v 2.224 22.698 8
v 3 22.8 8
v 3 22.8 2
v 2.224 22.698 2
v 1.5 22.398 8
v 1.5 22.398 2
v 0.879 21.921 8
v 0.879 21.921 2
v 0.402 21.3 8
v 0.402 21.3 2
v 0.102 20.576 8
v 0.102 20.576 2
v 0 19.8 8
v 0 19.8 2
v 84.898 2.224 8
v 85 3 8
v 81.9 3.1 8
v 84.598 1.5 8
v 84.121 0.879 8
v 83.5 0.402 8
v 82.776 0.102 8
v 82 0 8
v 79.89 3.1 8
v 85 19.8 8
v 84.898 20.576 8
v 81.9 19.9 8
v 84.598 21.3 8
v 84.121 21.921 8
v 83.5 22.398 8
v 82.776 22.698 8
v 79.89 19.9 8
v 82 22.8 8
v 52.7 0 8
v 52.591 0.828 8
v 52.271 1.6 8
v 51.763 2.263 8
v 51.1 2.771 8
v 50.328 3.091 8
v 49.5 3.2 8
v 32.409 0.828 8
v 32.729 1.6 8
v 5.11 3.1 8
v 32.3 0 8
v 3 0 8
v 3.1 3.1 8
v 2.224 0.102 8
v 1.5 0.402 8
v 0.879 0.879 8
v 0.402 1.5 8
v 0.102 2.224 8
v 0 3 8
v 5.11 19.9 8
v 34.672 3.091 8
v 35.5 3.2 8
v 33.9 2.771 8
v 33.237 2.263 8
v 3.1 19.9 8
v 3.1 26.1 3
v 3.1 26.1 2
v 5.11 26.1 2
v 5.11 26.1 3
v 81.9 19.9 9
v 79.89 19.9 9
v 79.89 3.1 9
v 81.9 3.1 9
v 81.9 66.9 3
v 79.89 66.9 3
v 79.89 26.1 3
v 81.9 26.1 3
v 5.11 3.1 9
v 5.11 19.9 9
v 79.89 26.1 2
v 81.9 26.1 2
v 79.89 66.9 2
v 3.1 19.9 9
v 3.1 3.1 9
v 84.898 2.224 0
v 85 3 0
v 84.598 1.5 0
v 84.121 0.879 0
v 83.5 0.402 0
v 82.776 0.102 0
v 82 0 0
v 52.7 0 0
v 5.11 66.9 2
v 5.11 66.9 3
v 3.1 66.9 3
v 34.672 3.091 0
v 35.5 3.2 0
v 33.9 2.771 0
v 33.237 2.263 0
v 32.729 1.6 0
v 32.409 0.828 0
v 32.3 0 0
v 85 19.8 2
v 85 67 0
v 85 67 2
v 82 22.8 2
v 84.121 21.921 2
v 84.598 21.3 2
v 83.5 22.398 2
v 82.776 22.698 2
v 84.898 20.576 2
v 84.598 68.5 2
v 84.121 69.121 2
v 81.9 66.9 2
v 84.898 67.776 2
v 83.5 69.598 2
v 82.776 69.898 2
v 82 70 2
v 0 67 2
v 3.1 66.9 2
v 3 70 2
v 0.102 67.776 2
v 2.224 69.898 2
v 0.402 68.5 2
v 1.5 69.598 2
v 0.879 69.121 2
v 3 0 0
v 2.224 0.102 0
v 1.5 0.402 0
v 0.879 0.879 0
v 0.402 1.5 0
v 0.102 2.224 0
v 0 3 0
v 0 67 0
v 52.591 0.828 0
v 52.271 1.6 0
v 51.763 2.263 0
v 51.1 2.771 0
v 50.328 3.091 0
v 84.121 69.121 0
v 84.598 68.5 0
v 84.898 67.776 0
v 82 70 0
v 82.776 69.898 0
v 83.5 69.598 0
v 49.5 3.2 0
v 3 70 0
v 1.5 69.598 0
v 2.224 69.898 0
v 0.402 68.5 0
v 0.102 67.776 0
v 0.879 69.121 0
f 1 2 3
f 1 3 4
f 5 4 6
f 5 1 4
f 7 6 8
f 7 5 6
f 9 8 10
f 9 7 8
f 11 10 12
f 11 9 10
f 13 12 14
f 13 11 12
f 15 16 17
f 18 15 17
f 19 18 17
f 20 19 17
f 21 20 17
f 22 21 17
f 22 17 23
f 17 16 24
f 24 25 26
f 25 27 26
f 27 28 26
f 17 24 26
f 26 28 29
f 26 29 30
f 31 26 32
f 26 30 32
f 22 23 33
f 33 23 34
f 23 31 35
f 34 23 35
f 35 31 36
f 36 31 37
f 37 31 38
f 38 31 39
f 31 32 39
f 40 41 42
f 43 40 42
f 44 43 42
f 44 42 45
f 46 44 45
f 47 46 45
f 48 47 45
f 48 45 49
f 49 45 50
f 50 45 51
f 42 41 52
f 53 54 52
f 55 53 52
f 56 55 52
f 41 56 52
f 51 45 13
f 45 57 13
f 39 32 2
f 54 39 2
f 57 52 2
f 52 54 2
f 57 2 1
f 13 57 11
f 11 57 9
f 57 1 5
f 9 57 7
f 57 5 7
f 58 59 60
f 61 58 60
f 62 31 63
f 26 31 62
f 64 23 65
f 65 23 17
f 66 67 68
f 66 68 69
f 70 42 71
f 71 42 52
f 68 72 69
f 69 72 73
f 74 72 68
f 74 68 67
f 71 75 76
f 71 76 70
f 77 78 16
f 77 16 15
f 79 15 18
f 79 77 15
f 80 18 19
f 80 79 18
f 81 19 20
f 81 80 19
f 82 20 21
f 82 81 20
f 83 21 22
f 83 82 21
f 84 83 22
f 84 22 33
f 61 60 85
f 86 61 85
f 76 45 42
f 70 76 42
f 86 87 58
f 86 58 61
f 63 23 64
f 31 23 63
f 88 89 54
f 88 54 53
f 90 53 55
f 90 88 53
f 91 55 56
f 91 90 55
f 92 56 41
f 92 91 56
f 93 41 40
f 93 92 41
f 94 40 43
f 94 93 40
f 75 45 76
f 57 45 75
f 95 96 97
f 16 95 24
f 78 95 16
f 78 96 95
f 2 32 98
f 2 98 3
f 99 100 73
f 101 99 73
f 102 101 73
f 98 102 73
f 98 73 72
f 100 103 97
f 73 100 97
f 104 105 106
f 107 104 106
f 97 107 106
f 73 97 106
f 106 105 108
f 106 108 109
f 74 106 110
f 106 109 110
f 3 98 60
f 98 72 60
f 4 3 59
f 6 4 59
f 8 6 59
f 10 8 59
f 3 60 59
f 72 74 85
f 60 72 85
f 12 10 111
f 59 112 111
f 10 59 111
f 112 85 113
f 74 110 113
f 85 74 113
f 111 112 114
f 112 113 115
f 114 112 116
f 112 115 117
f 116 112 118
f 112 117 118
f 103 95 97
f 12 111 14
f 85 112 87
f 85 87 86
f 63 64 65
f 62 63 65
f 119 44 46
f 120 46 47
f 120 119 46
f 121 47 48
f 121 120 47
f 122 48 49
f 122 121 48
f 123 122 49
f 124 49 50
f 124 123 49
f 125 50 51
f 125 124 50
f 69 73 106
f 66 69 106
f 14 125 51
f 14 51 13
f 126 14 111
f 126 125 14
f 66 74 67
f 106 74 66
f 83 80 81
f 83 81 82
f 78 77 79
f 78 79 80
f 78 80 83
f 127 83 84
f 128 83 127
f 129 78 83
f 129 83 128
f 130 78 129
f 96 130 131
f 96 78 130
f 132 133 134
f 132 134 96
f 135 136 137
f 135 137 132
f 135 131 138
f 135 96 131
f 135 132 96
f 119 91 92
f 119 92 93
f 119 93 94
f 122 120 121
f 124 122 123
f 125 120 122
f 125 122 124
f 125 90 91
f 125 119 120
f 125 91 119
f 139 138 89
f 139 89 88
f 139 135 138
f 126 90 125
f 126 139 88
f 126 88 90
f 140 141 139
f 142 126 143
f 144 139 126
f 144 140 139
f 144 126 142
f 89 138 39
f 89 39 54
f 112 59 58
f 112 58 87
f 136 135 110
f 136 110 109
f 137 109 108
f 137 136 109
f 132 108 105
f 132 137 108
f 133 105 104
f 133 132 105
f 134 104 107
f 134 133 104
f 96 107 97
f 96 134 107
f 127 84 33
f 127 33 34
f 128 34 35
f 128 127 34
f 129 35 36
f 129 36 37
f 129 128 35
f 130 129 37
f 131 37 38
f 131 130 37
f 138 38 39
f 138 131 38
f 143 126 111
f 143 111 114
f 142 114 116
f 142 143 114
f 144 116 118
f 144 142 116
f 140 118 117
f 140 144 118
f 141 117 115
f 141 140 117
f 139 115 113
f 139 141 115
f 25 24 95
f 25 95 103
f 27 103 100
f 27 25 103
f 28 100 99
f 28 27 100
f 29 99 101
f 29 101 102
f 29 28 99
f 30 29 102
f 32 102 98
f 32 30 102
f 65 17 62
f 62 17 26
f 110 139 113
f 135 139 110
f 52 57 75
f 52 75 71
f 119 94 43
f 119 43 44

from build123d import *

# Parameters (mm, degrees)
BOSS_EXTRUDE1_DEPTH = 8
CUT_EXTRUDE1_DEPTH  = 6
SKETCH3_W           = 2.01
SKETCH3_H           = 16.8
BOSS_EXTRUDE2_DEPTH = 1
SKETCH4_W           = 2.01
SKETCH4_H           = 40.8
BOSS_EXTRUDE3_DEPTH = 1


with BuildPart() as part:
    # Sketch1 → Boss-Extrude1 (new body)
    with BuildSketch(Plane.XY):
        with BuildLine():
            Line((3, 70), (82, 70))
            ThreePointArc((82, 70), (84.121320344, 69.121320344), (85, 67))
            Line((85, 67), (85, 3))
            ThreePointArc((85, 3), (84.121320344, 0.878679656), (82, 0))
            Line((82, 0), (52.7, 0))
            ThreePointArc((52.7, 0), (51.7627417, 2.2627417), (49.5, 3.2))
            Line((49.5, 3.2), (35.5, 3.2))
            ThreePointArc((35.5, 3.2), (33.2372583, 2.2627417), (32.3, 0))
            Line((32.3, 0), (3, 0))
            ThreePointArc((3, 0), (0.878679656, 0.878679656), (0, 3))
            Line((0, 3), (0, 67))
            ThreePointArc((0, 67), (0.878679656, 69.121320344), (3, 70))
        make_face()
    extrude(amount=BOSS_EXTRUDE1_DEPTH)

    # Sketch2 → Cut-Extrude1 (cut)
    with BuildSketch(Plane.XY.offset(8)):
        with BuildLine():
            Line((3, 70), (82, 70))
            ThreePointArc((82, 70), (84.121320344, 69.121320344), (85, 67))
            Line((85, 67), (85, 19.8))
            ThreePointArc((85, 19.8), (84.121320344, 21.921320344), (82, 22.8))
            Line((82, 22.8), (3, 22.8))
            ThreePointArc((3, 22.8), (0.878679656, 21.921320344), (0, 19.8))
            Line((0, 19.8), (0, 67))
            ThreePointArc((0, 67), (0.878679656, 69.121320344), (3, 70))
        make_face()
    extrude(amount=-CUT_EXTRUDE1_DEPTH, mode=Mode.SUBTRACT)

    # Sketch3 → Boss-Extrude2 (add)
    with BuildSketch(Plane.XY.offset(8)):
        with Locations((4.105, 11.5)):
            Rectangle(SKETCH3_W, SKETCH3_H)
        with Locations((80.895, 11.5)):
            Rectangle(SKETCH3_W, SKETCH3_H)
    extrude(amount=BOSS_EXTRUDE2_DEPTH)

    # Sketch4 → Boss-Extrude3 (add)
    with BuildSketch(Plane.XY.offset(2)):
        with Locations((4.105, 46.5)):
            Rectangle(SKETCH4_W, SKETCH4_H)
        with Locations((80.895, 46.5)):
            Rectangle(SKETCH4_W, SKETCH4_H)
    extrude(amount=BOSS_EXTRUDE3_DEPTH)


solid = part.part
